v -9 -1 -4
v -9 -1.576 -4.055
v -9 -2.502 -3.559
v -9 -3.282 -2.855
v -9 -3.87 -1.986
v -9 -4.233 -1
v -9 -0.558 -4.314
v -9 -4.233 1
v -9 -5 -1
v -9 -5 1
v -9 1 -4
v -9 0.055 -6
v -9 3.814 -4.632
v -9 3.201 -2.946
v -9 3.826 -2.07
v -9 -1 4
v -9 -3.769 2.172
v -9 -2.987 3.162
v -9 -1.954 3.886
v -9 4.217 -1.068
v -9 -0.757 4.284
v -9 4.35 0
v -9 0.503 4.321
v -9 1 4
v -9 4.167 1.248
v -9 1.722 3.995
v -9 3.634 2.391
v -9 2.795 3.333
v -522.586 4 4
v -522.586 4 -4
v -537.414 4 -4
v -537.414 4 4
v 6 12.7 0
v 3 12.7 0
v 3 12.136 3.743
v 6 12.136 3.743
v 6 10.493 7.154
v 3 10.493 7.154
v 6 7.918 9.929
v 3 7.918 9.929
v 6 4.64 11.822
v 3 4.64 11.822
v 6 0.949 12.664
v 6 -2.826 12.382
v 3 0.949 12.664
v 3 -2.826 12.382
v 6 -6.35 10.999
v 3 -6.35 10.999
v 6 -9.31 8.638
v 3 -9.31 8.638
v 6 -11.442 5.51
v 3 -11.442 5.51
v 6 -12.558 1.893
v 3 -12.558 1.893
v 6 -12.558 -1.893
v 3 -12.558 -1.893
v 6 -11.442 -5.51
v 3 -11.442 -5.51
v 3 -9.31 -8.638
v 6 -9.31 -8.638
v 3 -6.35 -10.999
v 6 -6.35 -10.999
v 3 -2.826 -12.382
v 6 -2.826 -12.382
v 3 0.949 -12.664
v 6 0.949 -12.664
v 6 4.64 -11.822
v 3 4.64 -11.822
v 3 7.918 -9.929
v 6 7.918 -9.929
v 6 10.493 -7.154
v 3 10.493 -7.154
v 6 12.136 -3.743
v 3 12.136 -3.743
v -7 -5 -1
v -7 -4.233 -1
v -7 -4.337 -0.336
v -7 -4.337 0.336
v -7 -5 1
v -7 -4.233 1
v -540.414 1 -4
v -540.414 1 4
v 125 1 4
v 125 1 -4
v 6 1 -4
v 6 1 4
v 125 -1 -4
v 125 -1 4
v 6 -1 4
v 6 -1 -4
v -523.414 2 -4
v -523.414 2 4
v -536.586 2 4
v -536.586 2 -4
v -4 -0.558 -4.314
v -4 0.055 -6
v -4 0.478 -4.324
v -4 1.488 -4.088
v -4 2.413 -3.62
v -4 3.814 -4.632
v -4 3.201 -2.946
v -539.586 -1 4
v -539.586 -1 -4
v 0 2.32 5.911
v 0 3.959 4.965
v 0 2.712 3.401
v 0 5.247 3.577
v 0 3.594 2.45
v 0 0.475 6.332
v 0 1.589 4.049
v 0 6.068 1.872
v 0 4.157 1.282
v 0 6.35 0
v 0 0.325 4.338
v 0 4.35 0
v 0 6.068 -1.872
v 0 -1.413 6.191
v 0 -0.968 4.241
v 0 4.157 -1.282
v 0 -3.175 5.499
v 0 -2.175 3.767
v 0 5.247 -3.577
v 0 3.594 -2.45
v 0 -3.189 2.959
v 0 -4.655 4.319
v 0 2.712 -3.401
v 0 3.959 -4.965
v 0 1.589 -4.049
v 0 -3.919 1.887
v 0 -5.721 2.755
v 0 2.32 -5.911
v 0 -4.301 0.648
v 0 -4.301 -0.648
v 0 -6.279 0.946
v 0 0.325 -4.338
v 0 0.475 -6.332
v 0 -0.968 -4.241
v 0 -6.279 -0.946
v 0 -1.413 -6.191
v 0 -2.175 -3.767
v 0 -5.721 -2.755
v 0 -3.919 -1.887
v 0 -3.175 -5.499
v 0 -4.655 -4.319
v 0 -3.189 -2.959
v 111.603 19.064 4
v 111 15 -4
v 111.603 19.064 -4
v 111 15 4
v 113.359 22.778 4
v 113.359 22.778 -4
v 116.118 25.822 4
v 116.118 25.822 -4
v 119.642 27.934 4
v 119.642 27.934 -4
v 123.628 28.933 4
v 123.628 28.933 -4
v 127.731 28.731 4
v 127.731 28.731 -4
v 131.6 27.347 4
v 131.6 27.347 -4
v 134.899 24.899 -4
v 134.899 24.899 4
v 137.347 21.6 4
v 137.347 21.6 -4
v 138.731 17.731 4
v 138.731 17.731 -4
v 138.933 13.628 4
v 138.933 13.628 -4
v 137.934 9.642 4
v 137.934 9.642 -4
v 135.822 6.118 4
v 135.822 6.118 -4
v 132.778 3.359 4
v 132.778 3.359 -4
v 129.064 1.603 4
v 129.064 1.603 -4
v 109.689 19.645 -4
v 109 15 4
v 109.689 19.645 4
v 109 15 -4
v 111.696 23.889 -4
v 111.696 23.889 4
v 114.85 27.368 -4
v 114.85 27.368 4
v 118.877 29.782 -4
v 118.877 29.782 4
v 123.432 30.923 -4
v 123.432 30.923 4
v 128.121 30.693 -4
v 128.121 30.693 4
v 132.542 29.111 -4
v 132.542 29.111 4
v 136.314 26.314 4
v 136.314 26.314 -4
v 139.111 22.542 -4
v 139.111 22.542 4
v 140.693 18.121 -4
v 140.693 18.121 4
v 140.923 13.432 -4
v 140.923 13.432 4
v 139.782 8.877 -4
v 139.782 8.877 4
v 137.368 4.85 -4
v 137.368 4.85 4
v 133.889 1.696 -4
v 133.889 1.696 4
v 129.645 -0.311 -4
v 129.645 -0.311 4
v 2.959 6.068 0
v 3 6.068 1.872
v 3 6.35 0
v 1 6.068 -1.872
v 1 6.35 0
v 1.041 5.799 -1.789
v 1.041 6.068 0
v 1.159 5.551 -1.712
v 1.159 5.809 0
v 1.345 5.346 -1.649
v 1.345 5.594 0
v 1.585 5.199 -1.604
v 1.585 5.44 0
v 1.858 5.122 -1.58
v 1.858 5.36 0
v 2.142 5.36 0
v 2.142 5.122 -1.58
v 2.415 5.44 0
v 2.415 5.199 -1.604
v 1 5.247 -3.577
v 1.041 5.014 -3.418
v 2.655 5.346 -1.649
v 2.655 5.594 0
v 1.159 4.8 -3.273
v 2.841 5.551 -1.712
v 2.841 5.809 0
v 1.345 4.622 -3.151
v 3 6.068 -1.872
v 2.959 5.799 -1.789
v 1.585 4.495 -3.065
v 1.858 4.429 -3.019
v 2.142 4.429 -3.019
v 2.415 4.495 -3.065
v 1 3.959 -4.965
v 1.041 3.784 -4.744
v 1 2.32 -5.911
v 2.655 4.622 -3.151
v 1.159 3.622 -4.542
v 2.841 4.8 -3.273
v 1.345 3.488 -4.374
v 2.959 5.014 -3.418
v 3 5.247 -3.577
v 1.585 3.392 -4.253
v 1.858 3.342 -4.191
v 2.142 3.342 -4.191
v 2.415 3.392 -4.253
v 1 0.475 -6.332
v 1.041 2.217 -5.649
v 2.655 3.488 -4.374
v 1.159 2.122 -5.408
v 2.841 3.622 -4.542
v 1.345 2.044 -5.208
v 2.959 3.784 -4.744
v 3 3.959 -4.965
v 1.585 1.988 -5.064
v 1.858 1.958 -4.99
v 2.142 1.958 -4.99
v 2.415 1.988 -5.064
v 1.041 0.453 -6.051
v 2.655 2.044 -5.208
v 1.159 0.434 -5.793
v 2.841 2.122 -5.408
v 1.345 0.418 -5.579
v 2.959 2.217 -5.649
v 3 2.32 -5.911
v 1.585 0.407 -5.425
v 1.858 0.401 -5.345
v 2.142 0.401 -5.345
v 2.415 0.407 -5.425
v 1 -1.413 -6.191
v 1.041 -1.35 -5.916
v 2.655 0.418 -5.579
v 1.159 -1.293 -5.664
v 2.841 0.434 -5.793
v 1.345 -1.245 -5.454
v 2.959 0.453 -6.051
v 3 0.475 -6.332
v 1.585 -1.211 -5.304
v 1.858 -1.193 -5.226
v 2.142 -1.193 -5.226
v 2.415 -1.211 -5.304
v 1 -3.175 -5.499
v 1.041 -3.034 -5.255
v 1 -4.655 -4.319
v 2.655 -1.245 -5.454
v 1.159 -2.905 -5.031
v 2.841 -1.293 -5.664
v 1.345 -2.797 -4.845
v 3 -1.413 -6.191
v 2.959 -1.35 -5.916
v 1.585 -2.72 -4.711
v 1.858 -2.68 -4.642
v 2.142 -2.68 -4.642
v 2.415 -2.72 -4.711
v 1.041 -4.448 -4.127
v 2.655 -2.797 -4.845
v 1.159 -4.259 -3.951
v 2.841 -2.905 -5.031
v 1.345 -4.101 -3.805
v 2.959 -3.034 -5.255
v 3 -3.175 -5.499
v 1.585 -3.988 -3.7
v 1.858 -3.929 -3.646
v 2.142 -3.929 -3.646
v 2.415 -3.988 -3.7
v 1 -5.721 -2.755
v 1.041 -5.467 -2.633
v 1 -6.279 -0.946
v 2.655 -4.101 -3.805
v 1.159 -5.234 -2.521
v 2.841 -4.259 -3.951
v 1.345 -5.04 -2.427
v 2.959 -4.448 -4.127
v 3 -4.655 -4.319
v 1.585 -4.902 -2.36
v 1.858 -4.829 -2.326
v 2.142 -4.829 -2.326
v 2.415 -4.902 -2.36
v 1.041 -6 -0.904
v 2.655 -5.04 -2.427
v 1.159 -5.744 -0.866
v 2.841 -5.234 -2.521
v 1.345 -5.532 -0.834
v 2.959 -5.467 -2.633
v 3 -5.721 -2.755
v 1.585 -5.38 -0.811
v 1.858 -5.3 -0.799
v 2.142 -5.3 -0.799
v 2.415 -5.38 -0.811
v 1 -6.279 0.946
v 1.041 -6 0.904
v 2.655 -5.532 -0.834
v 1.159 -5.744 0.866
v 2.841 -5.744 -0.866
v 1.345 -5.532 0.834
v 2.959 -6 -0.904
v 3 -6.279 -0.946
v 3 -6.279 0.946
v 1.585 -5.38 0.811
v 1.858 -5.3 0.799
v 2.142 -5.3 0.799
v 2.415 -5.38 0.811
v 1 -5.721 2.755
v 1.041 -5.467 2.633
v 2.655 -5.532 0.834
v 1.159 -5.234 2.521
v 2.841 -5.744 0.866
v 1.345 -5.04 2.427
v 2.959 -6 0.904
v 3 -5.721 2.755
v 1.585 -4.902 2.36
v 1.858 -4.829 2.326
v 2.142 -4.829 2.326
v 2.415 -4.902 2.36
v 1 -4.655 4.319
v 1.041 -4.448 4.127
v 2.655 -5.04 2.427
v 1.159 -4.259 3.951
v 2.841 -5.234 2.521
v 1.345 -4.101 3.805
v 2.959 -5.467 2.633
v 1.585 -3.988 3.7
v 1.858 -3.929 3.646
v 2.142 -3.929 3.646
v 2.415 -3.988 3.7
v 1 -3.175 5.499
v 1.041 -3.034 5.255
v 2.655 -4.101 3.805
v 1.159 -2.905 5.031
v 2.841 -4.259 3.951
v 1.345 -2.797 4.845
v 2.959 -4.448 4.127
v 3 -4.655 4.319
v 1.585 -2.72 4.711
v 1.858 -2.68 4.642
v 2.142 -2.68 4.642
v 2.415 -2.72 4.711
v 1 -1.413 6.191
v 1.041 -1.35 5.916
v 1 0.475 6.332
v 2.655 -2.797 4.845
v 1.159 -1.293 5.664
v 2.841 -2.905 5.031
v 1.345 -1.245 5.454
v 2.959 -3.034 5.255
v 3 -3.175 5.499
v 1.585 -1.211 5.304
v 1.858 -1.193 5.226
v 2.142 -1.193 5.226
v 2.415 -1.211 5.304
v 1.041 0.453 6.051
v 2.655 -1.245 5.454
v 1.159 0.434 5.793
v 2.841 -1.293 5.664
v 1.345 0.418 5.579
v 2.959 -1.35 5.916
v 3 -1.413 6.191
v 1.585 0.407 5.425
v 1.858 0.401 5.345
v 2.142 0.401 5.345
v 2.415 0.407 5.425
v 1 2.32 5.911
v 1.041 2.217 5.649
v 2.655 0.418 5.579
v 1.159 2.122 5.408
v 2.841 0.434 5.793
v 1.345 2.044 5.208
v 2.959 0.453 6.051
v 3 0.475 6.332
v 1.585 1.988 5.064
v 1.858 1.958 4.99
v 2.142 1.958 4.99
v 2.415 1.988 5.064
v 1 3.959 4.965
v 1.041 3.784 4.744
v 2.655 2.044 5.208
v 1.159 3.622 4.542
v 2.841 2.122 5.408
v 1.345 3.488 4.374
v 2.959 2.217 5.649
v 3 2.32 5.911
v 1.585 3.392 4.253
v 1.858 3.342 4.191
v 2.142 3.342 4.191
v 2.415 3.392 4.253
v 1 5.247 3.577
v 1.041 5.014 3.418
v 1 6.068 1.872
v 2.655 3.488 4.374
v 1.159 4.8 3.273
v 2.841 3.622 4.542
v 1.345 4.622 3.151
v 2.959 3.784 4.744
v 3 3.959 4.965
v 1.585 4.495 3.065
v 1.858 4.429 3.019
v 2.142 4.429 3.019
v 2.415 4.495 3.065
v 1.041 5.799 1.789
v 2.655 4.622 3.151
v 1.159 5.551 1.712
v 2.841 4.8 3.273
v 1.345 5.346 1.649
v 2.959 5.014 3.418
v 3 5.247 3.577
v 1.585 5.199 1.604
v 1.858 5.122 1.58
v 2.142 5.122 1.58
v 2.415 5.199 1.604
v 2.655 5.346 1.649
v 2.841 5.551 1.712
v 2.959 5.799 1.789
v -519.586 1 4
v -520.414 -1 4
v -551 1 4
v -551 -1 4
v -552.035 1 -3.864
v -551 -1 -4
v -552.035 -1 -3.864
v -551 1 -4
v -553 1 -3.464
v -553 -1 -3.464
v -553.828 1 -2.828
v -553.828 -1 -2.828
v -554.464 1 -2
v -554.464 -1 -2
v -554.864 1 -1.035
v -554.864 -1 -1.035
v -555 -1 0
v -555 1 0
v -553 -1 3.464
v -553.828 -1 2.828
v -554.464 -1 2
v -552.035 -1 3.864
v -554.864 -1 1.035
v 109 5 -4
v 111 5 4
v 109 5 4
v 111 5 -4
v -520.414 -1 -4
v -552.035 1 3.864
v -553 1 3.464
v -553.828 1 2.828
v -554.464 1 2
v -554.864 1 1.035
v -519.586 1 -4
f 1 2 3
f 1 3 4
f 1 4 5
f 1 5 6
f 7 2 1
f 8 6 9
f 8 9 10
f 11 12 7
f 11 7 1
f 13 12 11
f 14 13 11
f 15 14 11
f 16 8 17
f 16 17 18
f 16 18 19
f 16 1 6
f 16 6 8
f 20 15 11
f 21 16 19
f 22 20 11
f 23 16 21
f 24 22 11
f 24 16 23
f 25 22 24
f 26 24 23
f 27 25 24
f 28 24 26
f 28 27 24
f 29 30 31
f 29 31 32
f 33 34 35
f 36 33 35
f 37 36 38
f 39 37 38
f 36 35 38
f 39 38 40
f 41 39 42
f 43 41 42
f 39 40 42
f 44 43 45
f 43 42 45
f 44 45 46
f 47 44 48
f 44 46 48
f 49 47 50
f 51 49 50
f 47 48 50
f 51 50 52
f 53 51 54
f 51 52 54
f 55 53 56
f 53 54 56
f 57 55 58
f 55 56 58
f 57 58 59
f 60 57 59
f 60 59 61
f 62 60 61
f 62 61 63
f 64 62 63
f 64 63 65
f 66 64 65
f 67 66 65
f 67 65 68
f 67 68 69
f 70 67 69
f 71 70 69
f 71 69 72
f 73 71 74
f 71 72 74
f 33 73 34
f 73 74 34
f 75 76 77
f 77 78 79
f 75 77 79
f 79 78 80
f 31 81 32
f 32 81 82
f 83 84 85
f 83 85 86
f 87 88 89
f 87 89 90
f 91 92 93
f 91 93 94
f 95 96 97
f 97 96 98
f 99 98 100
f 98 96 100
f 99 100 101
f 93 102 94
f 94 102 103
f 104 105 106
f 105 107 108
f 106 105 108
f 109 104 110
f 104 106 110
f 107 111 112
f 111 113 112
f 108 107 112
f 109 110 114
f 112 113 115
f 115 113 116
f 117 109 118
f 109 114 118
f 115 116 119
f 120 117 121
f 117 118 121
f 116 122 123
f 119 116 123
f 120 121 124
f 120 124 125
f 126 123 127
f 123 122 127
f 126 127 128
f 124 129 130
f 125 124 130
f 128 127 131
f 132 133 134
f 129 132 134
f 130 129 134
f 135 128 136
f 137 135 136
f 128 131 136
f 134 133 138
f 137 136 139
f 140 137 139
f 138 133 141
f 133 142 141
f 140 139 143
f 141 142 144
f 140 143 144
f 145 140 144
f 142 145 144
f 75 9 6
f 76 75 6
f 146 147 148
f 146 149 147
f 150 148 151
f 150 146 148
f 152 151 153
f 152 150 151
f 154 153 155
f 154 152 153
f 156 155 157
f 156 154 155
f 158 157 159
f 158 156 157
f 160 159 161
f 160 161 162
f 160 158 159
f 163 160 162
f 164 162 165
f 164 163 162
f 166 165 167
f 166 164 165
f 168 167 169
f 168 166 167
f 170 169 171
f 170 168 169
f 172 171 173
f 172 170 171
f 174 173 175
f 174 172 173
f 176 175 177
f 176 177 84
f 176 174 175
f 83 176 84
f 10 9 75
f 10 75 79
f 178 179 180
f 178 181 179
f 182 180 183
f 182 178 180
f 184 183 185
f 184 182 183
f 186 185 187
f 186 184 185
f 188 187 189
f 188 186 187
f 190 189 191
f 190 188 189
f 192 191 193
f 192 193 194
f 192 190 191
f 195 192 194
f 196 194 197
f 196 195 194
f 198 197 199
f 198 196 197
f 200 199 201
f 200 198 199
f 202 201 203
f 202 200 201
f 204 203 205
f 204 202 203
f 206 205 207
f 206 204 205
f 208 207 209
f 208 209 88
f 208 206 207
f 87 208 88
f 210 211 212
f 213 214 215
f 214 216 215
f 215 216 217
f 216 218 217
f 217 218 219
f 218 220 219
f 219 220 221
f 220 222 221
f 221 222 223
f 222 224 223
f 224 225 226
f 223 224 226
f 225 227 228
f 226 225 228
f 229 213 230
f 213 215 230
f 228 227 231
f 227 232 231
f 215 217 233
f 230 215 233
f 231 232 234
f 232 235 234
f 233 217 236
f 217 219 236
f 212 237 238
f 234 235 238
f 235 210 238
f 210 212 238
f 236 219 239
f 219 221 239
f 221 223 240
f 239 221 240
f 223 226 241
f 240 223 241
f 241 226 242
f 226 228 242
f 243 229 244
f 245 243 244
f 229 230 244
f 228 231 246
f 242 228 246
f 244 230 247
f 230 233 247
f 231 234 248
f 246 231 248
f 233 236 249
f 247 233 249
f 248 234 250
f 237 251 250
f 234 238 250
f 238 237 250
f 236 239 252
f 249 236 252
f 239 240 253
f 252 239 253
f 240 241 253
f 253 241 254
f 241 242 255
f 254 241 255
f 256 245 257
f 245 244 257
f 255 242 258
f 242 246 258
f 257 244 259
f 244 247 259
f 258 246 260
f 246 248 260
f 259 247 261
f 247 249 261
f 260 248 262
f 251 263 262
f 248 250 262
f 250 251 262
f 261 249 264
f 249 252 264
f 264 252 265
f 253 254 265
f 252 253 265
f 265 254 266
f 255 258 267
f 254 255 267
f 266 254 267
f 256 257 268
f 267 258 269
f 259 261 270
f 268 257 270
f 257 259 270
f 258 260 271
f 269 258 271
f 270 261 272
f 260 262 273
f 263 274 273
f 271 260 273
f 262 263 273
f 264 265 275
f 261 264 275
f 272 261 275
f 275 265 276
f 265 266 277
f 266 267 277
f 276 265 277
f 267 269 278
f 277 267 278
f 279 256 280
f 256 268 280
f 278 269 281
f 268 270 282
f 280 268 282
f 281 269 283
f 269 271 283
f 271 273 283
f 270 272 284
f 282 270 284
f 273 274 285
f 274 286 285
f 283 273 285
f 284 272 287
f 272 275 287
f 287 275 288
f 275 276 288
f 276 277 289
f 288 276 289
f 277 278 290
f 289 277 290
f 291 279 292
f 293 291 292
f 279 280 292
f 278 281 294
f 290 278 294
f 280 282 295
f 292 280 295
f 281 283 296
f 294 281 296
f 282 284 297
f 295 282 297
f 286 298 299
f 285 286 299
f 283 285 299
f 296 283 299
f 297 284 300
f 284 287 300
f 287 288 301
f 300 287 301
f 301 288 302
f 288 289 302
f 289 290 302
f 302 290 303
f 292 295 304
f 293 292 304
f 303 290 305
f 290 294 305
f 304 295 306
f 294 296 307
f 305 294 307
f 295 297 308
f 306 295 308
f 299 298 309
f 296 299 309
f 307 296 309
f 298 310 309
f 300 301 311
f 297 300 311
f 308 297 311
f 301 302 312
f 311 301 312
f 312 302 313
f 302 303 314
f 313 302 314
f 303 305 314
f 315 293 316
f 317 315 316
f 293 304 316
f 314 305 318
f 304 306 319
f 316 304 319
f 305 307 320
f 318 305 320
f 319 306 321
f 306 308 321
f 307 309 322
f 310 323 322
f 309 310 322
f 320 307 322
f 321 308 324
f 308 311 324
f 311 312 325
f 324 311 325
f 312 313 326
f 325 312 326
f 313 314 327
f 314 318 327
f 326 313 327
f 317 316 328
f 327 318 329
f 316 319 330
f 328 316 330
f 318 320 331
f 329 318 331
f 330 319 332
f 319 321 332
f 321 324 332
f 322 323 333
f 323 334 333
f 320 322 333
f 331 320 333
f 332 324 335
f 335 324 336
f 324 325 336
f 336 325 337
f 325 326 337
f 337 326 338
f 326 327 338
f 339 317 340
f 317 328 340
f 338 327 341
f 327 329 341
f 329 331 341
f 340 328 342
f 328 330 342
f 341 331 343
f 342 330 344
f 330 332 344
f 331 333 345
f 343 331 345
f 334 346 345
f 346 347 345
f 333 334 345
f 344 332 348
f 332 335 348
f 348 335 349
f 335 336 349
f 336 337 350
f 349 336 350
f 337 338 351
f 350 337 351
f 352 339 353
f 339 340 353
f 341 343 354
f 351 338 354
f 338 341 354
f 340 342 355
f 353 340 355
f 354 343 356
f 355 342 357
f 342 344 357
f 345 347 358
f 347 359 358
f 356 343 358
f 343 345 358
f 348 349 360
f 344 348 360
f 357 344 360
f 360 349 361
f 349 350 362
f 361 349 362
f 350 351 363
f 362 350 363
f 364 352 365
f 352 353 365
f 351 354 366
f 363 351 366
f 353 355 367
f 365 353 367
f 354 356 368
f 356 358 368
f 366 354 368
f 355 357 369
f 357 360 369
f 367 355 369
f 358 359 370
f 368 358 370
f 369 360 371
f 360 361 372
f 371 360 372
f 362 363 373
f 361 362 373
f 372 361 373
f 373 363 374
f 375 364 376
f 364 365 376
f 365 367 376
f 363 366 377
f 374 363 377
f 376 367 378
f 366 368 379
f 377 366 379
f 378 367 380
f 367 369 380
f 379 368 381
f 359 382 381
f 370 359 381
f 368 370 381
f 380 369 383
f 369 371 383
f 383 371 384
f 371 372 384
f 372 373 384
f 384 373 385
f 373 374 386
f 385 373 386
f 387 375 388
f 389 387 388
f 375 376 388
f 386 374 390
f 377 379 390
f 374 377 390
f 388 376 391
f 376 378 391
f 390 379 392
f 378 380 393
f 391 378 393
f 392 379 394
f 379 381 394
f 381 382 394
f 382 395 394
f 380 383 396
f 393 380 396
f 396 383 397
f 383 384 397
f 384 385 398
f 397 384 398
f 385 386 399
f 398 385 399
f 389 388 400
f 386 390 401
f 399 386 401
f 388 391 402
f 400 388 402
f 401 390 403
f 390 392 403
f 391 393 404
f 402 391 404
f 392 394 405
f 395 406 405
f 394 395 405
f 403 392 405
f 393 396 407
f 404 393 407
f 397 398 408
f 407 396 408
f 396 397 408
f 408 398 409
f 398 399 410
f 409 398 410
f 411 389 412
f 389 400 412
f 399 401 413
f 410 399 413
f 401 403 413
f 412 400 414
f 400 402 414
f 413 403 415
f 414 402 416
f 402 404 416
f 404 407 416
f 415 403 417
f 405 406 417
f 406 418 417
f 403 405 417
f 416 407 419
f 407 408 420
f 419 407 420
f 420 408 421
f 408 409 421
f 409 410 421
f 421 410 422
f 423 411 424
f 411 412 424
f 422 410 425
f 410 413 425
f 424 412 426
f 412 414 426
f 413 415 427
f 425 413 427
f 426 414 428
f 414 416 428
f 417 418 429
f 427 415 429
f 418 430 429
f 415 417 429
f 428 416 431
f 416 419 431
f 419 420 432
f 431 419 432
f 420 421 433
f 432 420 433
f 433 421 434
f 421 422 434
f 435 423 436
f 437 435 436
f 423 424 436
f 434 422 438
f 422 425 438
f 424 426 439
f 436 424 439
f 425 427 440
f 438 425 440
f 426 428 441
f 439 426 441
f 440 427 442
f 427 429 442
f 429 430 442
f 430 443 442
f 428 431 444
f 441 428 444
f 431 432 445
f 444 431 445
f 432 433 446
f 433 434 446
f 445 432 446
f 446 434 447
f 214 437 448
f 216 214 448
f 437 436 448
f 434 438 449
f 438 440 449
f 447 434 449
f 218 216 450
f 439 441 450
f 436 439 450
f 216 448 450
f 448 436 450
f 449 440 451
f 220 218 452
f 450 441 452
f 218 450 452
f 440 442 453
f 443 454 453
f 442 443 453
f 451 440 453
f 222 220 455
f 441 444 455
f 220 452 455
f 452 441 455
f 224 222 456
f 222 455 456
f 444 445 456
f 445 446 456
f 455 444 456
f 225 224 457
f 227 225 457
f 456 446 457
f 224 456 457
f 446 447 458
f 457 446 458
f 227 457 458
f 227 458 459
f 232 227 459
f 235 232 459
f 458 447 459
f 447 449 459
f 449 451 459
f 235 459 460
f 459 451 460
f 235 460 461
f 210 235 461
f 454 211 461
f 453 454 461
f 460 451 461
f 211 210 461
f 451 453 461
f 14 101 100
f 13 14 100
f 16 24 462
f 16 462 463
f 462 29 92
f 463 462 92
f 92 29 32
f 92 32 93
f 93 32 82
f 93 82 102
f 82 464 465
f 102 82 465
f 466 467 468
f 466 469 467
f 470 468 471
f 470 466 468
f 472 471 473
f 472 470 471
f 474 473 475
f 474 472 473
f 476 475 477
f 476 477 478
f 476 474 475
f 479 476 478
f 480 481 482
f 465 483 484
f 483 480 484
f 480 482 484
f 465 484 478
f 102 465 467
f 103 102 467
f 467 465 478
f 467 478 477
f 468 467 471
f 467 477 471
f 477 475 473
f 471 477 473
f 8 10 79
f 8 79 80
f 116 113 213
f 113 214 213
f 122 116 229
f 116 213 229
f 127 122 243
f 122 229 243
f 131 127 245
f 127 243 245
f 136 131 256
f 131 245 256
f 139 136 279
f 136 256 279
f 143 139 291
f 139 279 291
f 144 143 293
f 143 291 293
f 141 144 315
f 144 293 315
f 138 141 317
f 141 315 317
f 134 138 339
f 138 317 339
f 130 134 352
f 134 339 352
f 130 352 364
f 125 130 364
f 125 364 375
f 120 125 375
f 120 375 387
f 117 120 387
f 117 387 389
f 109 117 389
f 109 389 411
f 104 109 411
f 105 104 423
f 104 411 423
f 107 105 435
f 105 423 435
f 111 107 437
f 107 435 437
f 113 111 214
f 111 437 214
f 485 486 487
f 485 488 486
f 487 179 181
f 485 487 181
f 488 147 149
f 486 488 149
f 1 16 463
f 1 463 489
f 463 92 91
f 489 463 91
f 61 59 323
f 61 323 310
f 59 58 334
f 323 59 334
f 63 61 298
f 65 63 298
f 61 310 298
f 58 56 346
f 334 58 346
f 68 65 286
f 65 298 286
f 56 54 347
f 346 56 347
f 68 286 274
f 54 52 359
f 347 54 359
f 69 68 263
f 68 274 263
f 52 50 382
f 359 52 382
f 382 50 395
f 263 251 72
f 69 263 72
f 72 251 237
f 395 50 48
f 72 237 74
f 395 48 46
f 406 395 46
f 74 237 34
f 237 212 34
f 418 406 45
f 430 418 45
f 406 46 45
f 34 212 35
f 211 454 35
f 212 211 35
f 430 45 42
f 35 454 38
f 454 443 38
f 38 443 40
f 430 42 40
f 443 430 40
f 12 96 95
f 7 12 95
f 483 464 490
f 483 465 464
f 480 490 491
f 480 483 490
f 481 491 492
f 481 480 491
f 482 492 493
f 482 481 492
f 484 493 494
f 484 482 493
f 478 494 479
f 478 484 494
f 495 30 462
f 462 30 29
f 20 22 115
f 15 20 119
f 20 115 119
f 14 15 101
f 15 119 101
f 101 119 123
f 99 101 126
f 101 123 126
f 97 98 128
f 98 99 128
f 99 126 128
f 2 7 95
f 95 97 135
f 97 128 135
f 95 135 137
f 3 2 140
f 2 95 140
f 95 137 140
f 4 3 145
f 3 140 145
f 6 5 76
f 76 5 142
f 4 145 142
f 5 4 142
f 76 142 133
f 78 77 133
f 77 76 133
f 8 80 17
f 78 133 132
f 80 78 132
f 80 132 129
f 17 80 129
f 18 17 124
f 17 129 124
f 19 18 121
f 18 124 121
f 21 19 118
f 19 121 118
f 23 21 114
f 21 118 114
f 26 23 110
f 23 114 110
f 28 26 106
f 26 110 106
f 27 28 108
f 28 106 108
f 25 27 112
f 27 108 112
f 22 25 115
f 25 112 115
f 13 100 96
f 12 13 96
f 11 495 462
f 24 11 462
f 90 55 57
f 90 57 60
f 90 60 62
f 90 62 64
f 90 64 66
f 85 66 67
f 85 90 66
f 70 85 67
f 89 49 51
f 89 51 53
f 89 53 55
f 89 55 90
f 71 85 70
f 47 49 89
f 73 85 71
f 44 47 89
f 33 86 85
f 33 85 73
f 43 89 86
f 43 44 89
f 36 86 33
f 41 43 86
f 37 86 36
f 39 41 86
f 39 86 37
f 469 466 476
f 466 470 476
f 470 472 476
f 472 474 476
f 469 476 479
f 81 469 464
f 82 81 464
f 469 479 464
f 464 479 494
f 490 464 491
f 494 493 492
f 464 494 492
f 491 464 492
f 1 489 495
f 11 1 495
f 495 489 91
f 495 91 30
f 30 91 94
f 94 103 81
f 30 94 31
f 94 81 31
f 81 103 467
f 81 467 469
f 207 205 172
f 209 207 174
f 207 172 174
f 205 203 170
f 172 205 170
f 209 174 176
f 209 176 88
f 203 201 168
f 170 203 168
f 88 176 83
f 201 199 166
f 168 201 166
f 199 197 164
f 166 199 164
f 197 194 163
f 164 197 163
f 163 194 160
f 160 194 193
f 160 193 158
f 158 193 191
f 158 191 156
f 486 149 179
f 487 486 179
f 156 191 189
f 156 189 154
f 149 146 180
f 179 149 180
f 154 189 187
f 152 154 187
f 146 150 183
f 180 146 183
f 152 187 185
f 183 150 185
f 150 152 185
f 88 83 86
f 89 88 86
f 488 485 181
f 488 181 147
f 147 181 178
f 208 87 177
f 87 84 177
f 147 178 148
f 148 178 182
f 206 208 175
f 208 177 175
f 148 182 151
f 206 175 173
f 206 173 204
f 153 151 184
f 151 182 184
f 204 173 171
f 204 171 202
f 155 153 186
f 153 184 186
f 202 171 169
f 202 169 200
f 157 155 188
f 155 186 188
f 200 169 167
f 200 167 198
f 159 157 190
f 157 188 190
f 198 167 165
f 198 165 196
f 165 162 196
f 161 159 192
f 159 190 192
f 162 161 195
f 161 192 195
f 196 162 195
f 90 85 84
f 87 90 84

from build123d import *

# Parameters (mm, degrees)
SZKIC6_R                    = 12.7
DODANIE_WYCI_GNI_CIE3_DEPTH = 3
SZKIC7_W                    = 8
SZKIC7_H                    = 2
ZAOKR_GLENIE3_R             = 4
SZKIC13_W                   = 2
SZKIC13_H                   = 5
DODANIE_WYCI_GNI_CIE5_DEPTH = 2
DODANIE_WYCI_GNI_CIE6_START = -5
DODANIE_WYCI_GNI_CIE6_DEPTH = 5


with BuildPart() as part:
    # Szkic5 → Obrót1 (revolve)
    with BuildSketch(Plane.XY):
        with BuildLine():
            Line((0, 6.35), (1, 6.35))
            ThreePointArc((1, 6.35), (2, 5.35), (3, 6.35))
            Line((3, 6.35), (3, 0))
            Line((3, 0), (0, 0))
            Line((0, 0), (-9, 0))
            Line((-9, 0), (-9, 4.35))
            Line((-9, 4.35), (0, 4.35))
            Line((0, 4.35), (0, 6.35))
        make_face()
    revolve(axis=Axis((0, 0, 0), (-1, 0, 0)))

    # Szkic6 → Dodanie-wyciągnięcie3 (add)
    with BuildSketch(Plane(origin=(3, 0, 0), x_dir=(0, 0, -1), z_dir=(1, 0, 0))):
        with Locations(Location((0, 0, 0), (0, 0, 90))):
            Circle(SZKIC6_R)
    extrude(amount=DODANIE_WYCI_GNI_CIE3_DEPTH)

    # Wyciągnięcie po ścieżce1: sweep along a path in Szkic1
    with BuildLine(Plane.XY) as wyci_gni_cie_po_cie_ce1_path:
        Line((110, 5), (110, 15))
        ThreePointArc((110, 15), (135.606601718, 25.606601718), (125, 0))
        Line((125, 0), (0, 0))
        Line((0, 0), (-520, 0))
        Line((-520, 0), (-523, 3))
        Line((-523, 3), (-537, 3))
        Line((-537, 3), (-540, 0))
        Line((-540, 0), (-555, 0))
    # Szkic7 → Wyciągnięcie po ścieżce1 (sweep)
    with BuildSketch(Plane(origin=(0, 0, 0), x_dir=(0, 0, -1), z_dir=(1, 0, 0))):
        Rectangle(SZKIC7_W, SZKIC7_H)
    sweep(path=wyci_gni_cie_po_cie_ce1_path.line, transition=Transition.RIGHT)

    # Zaokrąglenie3
    zaokr_glenie3_edges = [part.edges().sort_by_distance(p)[0] for p in [
        (-555, 0, -4),
        (-555, 0, 4),
    ]]
    fillet(zaokr_glenie3_edges, radius=ZAOKR_GLENIE3_R - 0.0001)  # a hair under: the kernel refuses the full size

    # Szkic13 → Dodanie-wyciągnięcie5 (add)
    with BuildSketch(Plane.ZY.offset(9)):
        with Locations((0, -2.5)):
            Rectangle(SZKIC13_W, SZKIC13_H)
    extrude(amount=-DODANIE_WYCI_GNI_CIE5_DEPTH)

    # Szkic14 → Dodanie-wyciągnięcie6 (add)
    with BuildSketch(Plane.ZY.offset(9).offset(DODANIE_WYCI_GNI_CIE6_START)):
        with BuildLine():
            Line((-2.94595959, 3.200597147), (-4.631919427, 3.814236344))
            Line((-4.631919427, 3.814236344), (-6, 0.055465861))
            Line((-6, 0.055465861), (-4.314040163, -0.558173336))
            ThreePointArc((-4.314040163, -0.558173336), (-4.0876629, 1.487787623), (-2.94595959, 3.200597147))
        make_face()
    extrude(amount=DODANIE_WYCI_GNI_CIE6_DEPTH)


solid = part.part
